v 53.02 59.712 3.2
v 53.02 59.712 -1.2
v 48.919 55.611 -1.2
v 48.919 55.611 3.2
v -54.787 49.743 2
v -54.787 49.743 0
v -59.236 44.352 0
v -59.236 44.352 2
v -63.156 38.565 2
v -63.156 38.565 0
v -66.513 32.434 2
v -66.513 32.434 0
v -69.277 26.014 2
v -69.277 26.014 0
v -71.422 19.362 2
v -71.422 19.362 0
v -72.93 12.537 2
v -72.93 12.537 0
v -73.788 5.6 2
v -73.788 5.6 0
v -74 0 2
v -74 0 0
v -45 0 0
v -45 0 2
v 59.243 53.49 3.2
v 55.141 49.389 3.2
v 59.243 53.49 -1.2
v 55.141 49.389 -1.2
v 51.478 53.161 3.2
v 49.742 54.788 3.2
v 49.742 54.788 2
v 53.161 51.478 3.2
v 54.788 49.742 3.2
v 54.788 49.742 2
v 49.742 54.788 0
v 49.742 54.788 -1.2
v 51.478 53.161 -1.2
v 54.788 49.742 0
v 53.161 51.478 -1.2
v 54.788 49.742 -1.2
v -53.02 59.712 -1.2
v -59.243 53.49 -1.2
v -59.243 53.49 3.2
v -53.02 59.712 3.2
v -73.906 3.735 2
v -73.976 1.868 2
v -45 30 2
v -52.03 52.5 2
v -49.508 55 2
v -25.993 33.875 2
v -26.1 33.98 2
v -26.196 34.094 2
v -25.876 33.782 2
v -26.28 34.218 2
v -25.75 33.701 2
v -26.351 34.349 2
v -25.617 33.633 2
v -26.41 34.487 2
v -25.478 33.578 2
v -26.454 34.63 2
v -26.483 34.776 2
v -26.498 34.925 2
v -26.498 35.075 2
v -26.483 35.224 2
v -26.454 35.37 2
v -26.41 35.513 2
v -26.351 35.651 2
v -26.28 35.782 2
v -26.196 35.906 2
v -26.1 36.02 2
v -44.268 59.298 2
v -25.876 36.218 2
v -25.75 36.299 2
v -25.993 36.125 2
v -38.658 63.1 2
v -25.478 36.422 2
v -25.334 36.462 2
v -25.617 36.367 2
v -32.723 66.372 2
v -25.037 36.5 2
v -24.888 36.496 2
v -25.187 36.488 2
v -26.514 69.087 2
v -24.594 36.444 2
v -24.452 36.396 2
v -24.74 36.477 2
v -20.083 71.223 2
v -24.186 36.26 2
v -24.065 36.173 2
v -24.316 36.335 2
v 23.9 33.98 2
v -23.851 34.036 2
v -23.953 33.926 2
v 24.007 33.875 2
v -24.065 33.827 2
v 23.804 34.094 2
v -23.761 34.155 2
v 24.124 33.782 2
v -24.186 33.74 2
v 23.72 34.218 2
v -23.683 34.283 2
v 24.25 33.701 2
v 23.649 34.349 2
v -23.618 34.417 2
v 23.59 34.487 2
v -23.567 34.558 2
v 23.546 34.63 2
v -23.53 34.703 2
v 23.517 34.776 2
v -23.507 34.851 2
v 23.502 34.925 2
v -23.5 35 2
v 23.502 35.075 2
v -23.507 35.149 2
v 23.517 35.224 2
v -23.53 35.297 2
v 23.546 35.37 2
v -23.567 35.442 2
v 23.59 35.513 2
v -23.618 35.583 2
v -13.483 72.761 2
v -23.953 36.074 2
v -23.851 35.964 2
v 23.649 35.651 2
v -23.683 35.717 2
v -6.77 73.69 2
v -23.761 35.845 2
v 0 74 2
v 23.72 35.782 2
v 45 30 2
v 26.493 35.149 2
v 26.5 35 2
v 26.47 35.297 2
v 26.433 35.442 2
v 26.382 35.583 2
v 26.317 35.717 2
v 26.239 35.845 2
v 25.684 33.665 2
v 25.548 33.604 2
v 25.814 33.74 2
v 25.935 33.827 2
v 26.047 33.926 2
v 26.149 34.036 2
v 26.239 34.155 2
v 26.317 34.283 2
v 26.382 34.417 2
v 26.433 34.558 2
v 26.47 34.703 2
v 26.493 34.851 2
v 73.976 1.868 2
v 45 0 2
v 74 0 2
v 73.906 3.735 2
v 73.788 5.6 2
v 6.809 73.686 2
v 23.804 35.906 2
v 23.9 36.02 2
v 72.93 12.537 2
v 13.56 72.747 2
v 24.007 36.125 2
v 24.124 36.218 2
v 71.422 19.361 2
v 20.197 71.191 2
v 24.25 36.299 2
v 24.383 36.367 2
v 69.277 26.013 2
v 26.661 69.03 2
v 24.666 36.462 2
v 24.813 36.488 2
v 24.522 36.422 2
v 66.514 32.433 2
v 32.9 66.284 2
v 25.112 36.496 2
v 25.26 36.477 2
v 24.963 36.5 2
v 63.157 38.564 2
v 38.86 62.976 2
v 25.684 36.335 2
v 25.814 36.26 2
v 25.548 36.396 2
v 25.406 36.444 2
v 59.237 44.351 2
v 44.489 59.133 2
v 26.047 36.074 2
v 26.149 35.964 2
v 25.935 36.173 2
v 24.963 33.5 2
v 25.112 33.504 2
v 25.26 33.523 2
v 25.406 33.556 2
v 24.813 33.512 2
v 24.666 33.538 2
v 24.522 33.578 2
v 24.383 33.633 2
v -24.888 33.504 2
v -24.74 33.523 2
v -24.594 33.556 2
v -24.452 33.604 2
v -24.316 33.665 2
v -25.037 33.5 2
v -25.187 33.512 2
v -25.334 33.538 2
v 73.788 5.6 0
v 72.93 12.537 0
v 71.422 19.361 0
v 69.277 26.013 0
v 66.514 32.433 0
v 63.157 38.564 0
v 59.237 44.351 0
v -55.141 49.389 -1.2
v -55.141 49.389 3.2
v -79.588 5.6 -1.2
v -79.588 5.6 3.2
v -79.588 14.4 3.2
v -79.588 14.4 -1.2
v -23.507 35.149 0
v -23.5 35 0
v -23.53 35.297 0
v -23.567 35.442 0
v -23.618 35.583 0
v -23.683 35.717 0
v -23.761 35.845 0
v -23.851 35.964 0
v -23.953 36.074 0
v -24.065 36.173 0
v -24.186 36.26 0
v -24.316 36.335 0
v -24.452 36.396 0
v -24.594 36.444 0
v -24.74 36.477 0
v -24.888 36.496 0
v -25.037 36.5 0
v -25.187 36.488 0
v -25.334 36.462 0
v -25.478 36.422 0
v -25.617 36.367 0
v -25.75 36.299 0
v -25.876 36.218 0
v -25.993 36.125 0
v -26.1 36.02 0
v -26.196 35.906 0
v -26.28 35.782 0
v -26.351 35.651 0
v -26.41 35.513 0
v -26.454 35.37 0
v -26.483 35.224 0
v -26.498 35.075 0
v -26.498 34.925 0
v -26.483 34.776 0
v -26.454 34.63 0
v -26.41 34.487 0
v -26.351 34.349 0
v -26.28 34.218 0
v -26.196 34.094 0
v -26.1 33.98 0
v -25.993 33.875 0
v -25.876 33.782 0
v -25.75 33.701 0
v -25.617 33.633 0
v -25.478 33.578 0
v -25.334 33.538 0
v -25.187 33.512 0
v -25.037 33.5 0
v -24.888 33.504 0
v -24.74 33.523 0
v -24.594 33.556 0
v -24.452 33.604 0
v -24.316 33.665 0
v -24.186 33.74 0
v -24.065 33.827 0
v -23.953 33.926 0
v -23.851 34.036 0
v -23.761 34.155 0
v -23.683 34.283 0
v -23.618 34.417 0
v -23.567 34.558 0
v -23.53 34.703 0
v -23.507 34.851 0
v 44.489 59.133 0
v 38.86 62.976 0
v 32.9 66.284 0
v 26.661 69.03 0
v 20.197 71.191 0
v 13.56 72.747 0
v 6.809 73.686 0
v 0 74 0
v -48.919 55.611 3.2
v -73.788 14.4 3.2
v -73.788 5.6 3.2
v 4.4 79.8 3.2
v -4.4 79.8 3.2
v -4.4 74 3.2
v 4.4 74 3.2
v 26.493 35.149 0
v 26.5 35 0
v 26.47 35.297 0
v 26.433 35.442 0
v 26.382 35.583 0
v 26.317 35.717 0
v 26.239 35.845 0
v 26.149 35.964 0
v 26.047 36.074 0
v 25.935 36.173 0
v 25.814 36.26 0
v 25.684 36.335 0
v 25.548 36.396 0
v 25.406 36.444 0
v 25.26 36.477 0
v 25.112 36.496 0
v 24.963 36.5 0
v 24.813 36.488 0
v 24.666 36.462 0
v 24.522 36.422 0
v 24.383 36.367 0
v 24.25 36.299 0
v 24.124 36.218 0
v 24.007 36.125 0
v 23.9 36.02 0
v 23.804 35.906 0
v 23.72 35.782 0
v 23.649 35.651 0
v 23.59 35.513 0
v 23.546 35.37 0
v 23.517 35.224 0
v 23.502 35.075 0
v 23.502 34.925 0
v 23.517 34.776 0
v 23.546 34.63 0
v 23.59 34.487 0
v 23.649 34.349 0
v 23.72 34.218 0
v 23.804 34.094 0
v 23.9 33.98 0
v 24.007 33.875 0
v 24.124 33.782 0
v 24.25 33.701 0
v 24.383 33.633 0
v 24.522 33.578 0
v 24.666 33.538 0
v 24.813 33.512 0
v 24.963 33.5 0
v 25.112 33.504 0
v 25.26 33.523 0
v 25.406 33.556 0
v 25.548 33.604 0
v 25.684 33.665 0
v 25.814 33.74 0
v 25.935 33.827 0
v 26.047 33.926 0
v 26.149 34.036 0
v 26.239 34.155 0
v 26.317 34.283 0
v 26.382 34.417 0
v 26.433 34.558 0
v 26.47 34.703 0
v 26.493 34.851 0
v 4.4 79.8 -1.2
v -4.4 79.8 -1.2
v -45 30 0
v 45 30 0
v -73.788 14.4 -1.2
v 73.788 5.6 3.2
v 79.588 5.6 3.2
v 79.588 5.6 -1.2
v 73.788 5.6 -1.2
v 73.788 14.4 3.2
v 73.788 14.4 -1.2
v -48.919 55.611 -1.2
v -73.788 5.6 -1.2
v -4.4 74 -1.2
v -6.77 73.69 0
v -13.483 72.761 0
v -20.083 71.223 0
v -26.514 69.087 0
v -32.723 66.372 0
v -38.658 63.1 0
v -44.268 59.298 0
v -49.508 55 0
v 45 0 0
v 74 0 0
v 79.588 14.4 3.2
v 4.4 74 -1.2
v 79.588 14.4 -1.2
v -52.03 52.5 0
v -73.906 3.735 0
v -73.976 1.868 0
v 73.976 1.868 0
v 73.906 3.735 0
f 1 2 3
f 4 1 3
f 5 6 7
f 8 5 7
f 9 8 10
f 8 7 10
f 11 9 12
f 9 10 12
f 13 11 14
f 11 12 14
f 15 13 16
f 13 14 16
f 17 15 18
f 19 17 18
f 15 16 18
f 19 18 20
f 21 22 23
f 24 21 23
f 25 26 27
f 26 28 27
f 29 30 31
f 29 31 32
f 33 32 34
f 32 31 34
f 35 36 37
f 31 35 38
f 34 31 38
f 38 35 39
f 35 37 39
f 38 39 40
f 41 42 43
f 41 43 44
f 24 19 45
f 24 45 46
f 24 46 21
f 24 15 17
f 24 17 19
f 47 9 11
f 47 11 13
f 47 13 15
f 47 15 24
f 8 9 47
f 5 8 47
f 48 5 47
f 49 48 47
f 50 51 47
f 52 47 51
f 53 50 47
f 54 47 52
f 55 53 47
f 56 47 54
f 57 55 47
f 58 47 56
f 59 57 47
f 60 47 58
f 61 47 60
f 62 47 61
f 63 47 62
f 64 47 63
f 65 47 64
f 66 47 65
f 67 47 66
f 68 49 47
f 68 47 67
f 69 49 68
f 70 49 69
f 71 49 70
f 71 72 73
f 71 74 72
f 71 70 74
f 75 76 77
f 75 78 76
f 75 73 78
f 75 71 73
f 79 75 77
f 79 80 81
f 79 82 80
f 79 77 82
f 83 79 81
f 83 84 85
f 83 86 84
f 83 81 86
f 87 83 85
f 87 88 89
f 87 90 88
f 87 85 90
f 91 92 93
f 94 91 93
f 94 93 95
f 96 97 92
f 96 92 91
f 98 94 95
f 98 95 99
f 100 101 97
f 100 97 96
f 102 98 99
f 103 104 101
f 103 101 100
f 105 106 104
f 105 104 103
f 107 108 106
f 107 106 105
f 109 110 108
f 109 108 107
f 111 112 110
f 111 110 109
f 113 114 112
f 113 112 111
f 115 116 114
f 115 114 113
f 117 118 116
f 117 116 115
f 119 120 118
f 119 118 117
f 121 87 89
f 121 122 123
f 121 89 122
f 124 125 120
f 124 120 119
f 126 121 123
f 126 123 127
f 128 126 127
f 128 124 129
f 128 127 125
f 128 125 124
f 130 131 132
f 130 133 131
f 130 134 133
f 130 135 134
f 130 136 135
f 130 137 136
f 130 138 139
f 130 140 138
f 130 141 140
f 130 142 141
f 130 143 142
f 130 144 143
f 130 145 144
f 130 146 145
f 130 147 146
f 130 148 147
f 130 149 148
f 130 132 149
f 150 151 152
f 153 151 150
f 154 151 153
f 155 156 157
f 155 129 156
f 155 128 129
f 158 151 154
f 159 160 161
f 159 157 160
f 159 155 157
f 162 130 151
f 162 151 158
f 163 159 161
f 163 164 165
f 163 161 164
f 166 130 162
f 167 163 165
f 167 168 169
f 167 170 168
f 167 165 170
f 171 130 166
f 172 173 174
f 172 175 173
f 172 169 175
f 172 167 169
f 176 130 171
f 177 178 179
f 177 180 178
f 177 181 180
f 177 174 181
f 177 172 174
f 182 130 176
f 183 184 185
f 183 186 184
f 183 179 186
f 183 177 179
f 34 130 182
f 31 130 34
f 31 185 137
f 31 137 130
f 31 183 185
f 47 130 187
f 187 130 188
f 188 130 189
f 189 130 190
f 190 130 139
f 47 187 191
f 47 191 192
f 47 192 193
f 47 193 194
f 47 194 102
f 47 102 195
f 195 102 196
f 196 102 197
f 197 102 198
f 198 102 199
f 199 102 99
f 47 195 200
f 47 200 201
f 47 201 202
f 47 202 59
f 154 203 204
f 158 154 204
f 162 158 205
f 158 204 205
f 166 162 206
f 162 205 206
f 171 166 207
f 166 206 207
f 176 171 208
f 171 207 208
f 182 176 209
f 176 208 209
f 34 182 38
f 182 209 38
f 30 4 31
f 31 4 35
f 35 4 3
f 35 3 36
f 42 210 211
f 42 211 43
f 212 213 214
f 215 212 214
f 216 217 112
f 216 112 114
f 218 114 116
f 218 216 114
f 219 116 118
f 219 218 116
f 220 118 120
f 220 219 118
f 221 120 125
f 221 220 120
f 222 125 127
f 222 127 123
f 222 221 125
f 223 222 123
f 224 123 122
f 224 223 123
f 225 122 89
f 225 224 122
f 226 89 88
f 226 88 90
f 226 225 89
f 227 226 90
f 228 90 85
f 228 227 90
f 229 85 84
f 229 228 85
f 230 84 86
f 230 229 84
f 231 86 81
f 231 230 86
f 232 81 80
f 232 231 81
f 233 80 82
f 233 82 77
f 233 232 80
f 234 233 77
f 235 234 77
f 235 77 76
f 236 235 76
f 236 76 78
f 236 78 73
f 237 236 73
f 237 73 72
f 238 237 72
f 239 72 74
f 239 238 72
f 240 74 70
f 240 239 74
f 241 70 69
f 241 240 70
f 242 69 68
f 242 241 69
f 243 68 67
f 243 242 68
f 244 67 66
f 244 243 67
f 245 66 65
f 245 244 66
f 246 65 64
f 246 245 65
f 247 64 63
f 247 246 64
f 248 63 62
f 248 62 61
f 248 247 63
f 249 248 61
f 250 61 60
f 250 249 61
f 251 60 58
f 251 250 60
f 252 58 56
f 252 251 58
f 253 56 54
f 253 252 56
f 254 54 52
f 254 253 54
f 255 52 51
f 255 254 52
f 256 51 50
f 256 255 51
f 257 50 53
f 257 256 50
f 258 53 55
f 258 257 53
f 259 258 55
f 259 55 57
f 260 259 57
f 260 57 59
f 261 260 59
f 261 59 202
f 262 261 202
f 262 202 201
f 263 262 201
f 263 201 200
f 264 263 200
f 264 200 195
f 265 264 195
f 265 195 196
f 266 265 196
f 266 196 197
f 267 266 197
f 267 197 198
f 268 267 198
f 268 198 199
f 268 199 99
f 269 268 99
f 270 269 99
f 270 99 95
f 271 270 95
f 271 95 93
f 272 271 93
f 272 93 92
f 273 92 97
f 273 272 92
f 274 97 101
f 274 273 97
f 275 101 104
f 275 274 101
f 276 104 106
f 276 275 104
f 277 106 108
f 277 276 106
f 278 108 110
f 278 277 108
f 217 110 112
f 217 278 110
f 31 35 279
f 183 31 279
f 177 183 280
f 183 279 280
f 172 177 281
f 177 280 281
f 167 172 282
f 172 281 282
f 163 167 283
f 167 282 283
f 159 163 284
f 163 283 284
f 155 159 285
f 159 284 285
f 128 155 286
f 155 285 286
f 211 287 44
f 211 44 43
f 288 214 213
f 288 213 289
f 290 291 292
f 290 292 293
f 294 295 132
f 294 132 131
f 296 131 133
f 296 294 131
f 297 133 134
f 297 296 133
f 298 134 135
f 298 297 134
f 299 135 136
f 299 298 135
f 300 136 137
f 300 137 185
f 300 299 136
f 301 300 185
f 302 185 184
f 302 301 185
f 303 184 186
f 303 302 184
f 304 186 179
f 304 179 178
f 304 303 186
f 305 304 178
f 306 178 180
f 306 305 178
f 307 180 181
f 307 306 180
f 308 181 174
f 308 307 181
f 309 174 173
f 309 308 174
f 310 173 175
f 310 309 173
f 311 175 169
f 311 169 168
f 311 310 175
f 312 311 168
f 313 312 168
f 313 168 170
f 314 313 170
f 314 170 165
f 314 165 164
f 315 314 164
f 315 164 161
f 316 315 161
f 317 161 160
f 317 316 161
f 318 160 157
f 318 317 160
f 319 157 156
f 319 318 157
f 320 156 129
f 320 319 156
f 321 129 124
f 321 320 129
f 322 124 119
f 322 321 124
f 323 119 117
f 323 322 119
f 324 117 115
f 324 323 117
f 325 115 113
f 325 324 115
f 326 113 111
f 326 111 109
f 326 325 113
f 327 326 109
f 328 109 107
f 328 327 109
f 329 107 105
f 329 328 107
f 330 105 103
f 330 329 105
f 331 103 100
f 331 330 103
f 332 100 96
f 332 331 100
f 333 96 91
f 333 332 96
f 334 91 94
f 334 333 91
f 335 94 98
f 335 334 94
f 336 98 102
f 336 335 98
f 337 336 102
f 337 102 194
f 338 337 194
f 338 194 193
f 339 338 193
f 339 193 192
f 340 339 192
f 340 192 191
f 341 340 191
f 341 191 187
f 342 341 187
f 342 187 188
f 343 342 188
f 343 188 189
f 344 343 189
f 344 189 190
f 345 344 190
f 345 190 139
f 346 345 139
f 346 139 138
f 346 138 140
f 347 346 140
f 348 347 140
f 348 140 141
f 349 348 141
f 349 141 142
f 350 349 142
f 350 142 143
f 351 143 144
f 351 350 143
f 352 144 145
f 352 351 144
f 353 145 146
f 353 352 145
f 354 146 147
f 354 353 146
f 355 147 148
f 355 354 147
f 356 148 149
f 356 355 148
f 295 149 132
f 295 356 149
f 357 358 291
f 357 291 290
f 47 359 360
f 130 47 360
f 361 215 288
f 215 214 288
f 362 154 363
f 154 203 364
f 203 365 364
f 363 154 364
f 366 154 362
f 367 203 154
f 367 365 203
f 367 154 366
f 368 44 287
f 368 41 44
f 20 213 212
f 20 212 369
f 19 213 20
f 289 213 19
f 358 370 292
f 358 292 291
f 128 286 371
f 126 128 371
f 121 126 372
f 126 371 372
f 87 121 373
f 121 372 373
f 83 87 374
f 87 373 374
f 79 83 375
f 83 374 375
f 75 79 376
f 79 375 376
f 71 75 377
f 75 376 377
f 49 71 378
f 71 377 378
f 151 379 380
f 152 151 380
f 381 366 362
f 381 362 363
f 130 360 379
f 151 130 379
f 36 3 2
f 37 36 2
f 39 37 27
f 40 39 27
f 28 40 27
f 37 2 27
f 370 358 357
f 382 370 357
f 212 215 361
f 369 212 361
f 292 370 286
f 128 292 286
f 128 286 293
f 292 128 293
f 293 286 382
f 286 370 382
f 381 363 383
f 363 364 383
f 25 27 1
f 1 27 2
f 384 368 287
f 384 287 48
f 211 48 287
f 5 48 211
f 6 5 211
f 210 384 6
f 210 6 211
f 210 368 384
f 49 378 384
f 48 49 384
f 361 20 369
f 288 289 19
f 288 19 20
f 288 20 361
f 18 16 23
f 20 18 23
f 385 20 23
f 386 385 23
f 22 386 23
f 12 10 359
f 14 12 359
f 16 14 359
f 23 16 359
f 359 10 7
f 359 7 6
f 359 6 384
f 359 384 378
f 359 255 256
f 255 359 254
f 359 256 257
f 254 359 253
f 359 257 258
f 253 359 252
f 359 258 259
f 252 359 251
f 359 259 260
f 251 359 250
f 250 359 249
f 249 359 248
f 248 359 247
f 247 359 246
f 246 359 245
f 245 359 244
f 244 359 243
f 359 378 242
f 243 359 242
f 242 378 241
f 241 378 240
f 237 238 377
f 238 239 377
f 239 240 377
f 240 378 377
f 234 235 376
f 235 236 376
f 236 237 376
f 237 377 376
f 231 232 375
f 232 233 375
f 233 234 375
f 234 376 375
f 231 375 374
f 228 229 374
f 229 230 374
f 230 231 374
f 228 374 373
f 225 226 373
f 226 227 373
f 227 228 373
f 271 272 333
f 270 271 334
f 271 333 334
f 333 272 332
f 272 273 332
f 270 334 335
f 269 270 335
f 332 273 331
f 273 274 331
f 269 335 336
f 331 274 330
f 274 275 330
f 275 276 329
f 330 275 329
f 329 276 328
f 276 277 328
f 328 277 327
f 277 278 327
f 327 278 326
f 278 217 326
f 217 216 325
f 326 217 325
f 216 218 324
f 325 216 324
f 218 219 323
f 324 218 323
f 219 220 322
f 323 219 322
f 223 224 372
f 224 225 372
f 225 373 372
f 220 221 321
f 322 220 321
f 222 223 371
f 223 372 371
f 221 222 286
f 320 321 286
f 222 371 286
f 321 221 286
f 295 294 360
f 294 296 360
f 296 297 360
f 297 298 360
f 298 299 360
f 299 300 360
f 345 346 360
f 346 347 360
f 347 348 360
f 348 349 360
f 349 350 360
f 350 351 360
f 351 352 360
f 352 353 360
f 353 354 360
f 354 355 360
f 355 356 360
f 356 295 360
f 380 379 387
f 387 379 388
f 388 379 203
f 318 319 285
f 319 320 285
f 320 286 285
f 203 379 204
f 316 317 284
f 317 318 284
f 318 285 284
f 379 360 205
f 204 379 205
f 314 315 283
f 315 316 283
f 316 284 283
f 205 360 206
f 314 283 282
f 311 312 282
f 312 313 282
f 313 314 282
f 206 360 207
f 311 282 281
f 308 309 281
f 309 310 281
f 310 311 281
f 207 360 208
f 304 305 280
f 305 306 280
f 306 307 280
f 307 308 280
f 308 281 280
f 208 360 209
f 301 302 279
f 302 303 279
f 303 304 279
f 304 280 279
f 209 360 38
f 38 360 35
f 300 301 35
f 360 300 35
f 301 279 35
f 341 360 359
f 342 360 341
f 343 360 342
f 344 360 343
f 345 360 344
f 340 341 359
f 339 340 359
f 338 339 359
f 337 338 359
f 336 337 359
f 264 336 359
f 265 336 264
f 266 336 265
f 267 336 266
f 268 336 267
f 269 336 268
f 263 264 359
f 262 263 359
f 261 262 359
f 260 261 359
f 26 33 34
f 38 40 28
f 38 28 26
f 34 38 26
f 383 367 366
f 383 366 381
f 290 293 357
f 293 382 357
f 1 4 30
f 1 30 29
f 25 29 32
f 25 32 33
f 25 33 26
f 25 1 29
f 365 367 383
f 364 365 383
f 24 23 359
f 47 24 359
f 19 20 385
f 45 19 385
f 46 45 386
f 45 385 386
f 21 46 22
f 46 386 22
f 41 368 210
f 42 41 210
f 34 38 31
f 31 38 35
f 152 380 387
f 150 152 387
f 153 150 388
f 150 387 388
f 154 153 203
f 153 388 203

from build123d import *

# Parameters (mm, degrees)
ESQUISSE3_R             = 1.5
BOSS_EXTRU_1_DEPTH      = 2
BOSS_EXTRU_6_DEPTH      = 3.2
BOSS_EXTRU_6_DEPTH_BACK = 1.2
ESQUISSE3_3_W           = 5.8
ESQUISSE3_3_H           = 8.8
ESQUISSE3_3_W_2         = 8.8
ESQUISSE3_3_H_2         = 5.8


with BuildPart() as part:
    # Esquisse3 → Boss.-Extru.1 (new body)
    with BuildSketch(Plane.XY):
        with BuildLine():
            ThreePointArc((-73.78780387, 5.6), (-73.946931939, 2.802009422), (-74, 0))
            Line((-74, 0), (-45, 0))
            Line((-45, 0), (-45, 30))
            Line((-45, 30), (45, 30))
            Line((45, 30), (45, 0))
            Line((45, 0), (74, 0))
            ThreePointArc((74, 0), (73.946931939, 2.802009422), (73.78780387, 5.6))
            ThreePointArc((73.78780387, 5.6), (67.971162967, 29.256127647), (54.788343562, 49.741706945))
            Line((54.788343562, 49.741706945), (49.741706945, 54.788343562))
            ThreePointArc((49.741706945, 54.788343562), (26.661419471, 69.030201447), (0, 74))
            ThreePointArc((0, 74), (-26.514147167, 69.086901798), (-49.507575178, 55))
            Line((-49.507575178, 55), (-52.030150983, 52.5))
            Line((-52.030150983, 52.5), (-54.787353008, 49.742797975))
            ThreePointArc((-54.787353008, 49.742797975), (-67.970871665, 29.256804425), (-73.78780387, 5.6))
        make_face()
        with Locations((-25, 35)):
            Circle(ESQUISSE3_R, mode=Mode.SUBTRACT)
        with Locations((25, 35)):
            Circle(ESQUISSE3_R, mode=Mode.SUBTRACT)
    extrude(amount=BOSS_EXTRU_1_DEPTH)

    # Esquisse3<3> → Boss.-Extru.6 (add, two sides: drawn at the far end of the back side and taken through both)
    with BuildSketch(Plane.XY.offset(-BOSS_EXTRU_6_DEPTH_BACK)):
        with Locations((-76.68780387, 10)):
            Rectangle(ESQUISSE3_3_W, ESQUISSE3_3_H)
        with Locations((0, 76.9)):
            Rectangle(ESQUISSE3_3_W_2, ESQUISSE3_3_H_2)
        with Locations((76.68780387, 10)):
            Rectangle(ESQUISSE3_3_W, ESQUISSE3_3_H)
        Polygon((-48.918881146, 55.611269837), (-53.020100477, 59.712489168), (-59.242640151, 53.489949494), (-55.14142082, 49.388730163), align=None)
        with BuildLine():
            Line((48.918780669, 55.611269837), (49.741706945, 54.788343562))
            ThreePointArc((49.741706945, 54.788343562), (52.325901808, 52.325901808), (54.788343562, 49.741706945))
            Line((54.788343562, 49.741706945), (55.141320344, 49.388730163))
            Line((55.141320344, 49.388730163), (59.242539674, 53.489949494))
            Line((59.242539674, 53.489949494), (53.02, 59.712489168))
            Line((53.02, 59.712489168), (48.918780669, 55.611269837))
        make_face()
    extrude(amount=BOSS_EXTRU_6_DEPTH + BOSS_EXTRU_6_DEPTH_BACK)


with BuildPart() as boss_extru_6_piece_1:
    # of the separate pieces the step leaves, piece 1, a body of its own (boss_extru_6_pieces)
    add(part.part.solids().sort_by_distance((-52.030150983, 52.5, 2))[0])


with BuildPart() as boss_extru_6_piece_2:
    # of the separate pieces the step leaves, piece 2, a body of its own (boss_extru_6_pieces)
    add(part.part.solids().sort_by_distance((-79.58780387, 5.6, 3.2))[0])


with BuildPart() as boss_extru_6_piece_3:
    # of the separate pieces the step leaves, piece 3, a body of its own (boss_extru_6_pieces)
    add(part.part.solids().sort_by_distance((73.78780387, 14.4, 3.2))[0])


with BuildPart() as boss_extru_6_piece_4:
    # of the separate pieces the step leaves, piece 4, a body of its own (boss_extru_6_pieces)
    add(part.part.solids().sort_by_distance((-4.4, 74, 3.2))[0])


with BuildPart() as boss_extru_6_piece_5:
    # of the separate pieces the step leaves, piece 5, a body of its own (boss_extru_6_pieces)
    add(part.part.solids().sort_by_distance((54.788343562, 49.741706945, 3.2))[0])


solid = Compound([boss_extru_6_piece_1.part, boss_extru_6_piece_2.part, boss_extru_6_piece_3.part, boss_extru_6_piece_4.part, boss_extru_6_piece_5.part])
